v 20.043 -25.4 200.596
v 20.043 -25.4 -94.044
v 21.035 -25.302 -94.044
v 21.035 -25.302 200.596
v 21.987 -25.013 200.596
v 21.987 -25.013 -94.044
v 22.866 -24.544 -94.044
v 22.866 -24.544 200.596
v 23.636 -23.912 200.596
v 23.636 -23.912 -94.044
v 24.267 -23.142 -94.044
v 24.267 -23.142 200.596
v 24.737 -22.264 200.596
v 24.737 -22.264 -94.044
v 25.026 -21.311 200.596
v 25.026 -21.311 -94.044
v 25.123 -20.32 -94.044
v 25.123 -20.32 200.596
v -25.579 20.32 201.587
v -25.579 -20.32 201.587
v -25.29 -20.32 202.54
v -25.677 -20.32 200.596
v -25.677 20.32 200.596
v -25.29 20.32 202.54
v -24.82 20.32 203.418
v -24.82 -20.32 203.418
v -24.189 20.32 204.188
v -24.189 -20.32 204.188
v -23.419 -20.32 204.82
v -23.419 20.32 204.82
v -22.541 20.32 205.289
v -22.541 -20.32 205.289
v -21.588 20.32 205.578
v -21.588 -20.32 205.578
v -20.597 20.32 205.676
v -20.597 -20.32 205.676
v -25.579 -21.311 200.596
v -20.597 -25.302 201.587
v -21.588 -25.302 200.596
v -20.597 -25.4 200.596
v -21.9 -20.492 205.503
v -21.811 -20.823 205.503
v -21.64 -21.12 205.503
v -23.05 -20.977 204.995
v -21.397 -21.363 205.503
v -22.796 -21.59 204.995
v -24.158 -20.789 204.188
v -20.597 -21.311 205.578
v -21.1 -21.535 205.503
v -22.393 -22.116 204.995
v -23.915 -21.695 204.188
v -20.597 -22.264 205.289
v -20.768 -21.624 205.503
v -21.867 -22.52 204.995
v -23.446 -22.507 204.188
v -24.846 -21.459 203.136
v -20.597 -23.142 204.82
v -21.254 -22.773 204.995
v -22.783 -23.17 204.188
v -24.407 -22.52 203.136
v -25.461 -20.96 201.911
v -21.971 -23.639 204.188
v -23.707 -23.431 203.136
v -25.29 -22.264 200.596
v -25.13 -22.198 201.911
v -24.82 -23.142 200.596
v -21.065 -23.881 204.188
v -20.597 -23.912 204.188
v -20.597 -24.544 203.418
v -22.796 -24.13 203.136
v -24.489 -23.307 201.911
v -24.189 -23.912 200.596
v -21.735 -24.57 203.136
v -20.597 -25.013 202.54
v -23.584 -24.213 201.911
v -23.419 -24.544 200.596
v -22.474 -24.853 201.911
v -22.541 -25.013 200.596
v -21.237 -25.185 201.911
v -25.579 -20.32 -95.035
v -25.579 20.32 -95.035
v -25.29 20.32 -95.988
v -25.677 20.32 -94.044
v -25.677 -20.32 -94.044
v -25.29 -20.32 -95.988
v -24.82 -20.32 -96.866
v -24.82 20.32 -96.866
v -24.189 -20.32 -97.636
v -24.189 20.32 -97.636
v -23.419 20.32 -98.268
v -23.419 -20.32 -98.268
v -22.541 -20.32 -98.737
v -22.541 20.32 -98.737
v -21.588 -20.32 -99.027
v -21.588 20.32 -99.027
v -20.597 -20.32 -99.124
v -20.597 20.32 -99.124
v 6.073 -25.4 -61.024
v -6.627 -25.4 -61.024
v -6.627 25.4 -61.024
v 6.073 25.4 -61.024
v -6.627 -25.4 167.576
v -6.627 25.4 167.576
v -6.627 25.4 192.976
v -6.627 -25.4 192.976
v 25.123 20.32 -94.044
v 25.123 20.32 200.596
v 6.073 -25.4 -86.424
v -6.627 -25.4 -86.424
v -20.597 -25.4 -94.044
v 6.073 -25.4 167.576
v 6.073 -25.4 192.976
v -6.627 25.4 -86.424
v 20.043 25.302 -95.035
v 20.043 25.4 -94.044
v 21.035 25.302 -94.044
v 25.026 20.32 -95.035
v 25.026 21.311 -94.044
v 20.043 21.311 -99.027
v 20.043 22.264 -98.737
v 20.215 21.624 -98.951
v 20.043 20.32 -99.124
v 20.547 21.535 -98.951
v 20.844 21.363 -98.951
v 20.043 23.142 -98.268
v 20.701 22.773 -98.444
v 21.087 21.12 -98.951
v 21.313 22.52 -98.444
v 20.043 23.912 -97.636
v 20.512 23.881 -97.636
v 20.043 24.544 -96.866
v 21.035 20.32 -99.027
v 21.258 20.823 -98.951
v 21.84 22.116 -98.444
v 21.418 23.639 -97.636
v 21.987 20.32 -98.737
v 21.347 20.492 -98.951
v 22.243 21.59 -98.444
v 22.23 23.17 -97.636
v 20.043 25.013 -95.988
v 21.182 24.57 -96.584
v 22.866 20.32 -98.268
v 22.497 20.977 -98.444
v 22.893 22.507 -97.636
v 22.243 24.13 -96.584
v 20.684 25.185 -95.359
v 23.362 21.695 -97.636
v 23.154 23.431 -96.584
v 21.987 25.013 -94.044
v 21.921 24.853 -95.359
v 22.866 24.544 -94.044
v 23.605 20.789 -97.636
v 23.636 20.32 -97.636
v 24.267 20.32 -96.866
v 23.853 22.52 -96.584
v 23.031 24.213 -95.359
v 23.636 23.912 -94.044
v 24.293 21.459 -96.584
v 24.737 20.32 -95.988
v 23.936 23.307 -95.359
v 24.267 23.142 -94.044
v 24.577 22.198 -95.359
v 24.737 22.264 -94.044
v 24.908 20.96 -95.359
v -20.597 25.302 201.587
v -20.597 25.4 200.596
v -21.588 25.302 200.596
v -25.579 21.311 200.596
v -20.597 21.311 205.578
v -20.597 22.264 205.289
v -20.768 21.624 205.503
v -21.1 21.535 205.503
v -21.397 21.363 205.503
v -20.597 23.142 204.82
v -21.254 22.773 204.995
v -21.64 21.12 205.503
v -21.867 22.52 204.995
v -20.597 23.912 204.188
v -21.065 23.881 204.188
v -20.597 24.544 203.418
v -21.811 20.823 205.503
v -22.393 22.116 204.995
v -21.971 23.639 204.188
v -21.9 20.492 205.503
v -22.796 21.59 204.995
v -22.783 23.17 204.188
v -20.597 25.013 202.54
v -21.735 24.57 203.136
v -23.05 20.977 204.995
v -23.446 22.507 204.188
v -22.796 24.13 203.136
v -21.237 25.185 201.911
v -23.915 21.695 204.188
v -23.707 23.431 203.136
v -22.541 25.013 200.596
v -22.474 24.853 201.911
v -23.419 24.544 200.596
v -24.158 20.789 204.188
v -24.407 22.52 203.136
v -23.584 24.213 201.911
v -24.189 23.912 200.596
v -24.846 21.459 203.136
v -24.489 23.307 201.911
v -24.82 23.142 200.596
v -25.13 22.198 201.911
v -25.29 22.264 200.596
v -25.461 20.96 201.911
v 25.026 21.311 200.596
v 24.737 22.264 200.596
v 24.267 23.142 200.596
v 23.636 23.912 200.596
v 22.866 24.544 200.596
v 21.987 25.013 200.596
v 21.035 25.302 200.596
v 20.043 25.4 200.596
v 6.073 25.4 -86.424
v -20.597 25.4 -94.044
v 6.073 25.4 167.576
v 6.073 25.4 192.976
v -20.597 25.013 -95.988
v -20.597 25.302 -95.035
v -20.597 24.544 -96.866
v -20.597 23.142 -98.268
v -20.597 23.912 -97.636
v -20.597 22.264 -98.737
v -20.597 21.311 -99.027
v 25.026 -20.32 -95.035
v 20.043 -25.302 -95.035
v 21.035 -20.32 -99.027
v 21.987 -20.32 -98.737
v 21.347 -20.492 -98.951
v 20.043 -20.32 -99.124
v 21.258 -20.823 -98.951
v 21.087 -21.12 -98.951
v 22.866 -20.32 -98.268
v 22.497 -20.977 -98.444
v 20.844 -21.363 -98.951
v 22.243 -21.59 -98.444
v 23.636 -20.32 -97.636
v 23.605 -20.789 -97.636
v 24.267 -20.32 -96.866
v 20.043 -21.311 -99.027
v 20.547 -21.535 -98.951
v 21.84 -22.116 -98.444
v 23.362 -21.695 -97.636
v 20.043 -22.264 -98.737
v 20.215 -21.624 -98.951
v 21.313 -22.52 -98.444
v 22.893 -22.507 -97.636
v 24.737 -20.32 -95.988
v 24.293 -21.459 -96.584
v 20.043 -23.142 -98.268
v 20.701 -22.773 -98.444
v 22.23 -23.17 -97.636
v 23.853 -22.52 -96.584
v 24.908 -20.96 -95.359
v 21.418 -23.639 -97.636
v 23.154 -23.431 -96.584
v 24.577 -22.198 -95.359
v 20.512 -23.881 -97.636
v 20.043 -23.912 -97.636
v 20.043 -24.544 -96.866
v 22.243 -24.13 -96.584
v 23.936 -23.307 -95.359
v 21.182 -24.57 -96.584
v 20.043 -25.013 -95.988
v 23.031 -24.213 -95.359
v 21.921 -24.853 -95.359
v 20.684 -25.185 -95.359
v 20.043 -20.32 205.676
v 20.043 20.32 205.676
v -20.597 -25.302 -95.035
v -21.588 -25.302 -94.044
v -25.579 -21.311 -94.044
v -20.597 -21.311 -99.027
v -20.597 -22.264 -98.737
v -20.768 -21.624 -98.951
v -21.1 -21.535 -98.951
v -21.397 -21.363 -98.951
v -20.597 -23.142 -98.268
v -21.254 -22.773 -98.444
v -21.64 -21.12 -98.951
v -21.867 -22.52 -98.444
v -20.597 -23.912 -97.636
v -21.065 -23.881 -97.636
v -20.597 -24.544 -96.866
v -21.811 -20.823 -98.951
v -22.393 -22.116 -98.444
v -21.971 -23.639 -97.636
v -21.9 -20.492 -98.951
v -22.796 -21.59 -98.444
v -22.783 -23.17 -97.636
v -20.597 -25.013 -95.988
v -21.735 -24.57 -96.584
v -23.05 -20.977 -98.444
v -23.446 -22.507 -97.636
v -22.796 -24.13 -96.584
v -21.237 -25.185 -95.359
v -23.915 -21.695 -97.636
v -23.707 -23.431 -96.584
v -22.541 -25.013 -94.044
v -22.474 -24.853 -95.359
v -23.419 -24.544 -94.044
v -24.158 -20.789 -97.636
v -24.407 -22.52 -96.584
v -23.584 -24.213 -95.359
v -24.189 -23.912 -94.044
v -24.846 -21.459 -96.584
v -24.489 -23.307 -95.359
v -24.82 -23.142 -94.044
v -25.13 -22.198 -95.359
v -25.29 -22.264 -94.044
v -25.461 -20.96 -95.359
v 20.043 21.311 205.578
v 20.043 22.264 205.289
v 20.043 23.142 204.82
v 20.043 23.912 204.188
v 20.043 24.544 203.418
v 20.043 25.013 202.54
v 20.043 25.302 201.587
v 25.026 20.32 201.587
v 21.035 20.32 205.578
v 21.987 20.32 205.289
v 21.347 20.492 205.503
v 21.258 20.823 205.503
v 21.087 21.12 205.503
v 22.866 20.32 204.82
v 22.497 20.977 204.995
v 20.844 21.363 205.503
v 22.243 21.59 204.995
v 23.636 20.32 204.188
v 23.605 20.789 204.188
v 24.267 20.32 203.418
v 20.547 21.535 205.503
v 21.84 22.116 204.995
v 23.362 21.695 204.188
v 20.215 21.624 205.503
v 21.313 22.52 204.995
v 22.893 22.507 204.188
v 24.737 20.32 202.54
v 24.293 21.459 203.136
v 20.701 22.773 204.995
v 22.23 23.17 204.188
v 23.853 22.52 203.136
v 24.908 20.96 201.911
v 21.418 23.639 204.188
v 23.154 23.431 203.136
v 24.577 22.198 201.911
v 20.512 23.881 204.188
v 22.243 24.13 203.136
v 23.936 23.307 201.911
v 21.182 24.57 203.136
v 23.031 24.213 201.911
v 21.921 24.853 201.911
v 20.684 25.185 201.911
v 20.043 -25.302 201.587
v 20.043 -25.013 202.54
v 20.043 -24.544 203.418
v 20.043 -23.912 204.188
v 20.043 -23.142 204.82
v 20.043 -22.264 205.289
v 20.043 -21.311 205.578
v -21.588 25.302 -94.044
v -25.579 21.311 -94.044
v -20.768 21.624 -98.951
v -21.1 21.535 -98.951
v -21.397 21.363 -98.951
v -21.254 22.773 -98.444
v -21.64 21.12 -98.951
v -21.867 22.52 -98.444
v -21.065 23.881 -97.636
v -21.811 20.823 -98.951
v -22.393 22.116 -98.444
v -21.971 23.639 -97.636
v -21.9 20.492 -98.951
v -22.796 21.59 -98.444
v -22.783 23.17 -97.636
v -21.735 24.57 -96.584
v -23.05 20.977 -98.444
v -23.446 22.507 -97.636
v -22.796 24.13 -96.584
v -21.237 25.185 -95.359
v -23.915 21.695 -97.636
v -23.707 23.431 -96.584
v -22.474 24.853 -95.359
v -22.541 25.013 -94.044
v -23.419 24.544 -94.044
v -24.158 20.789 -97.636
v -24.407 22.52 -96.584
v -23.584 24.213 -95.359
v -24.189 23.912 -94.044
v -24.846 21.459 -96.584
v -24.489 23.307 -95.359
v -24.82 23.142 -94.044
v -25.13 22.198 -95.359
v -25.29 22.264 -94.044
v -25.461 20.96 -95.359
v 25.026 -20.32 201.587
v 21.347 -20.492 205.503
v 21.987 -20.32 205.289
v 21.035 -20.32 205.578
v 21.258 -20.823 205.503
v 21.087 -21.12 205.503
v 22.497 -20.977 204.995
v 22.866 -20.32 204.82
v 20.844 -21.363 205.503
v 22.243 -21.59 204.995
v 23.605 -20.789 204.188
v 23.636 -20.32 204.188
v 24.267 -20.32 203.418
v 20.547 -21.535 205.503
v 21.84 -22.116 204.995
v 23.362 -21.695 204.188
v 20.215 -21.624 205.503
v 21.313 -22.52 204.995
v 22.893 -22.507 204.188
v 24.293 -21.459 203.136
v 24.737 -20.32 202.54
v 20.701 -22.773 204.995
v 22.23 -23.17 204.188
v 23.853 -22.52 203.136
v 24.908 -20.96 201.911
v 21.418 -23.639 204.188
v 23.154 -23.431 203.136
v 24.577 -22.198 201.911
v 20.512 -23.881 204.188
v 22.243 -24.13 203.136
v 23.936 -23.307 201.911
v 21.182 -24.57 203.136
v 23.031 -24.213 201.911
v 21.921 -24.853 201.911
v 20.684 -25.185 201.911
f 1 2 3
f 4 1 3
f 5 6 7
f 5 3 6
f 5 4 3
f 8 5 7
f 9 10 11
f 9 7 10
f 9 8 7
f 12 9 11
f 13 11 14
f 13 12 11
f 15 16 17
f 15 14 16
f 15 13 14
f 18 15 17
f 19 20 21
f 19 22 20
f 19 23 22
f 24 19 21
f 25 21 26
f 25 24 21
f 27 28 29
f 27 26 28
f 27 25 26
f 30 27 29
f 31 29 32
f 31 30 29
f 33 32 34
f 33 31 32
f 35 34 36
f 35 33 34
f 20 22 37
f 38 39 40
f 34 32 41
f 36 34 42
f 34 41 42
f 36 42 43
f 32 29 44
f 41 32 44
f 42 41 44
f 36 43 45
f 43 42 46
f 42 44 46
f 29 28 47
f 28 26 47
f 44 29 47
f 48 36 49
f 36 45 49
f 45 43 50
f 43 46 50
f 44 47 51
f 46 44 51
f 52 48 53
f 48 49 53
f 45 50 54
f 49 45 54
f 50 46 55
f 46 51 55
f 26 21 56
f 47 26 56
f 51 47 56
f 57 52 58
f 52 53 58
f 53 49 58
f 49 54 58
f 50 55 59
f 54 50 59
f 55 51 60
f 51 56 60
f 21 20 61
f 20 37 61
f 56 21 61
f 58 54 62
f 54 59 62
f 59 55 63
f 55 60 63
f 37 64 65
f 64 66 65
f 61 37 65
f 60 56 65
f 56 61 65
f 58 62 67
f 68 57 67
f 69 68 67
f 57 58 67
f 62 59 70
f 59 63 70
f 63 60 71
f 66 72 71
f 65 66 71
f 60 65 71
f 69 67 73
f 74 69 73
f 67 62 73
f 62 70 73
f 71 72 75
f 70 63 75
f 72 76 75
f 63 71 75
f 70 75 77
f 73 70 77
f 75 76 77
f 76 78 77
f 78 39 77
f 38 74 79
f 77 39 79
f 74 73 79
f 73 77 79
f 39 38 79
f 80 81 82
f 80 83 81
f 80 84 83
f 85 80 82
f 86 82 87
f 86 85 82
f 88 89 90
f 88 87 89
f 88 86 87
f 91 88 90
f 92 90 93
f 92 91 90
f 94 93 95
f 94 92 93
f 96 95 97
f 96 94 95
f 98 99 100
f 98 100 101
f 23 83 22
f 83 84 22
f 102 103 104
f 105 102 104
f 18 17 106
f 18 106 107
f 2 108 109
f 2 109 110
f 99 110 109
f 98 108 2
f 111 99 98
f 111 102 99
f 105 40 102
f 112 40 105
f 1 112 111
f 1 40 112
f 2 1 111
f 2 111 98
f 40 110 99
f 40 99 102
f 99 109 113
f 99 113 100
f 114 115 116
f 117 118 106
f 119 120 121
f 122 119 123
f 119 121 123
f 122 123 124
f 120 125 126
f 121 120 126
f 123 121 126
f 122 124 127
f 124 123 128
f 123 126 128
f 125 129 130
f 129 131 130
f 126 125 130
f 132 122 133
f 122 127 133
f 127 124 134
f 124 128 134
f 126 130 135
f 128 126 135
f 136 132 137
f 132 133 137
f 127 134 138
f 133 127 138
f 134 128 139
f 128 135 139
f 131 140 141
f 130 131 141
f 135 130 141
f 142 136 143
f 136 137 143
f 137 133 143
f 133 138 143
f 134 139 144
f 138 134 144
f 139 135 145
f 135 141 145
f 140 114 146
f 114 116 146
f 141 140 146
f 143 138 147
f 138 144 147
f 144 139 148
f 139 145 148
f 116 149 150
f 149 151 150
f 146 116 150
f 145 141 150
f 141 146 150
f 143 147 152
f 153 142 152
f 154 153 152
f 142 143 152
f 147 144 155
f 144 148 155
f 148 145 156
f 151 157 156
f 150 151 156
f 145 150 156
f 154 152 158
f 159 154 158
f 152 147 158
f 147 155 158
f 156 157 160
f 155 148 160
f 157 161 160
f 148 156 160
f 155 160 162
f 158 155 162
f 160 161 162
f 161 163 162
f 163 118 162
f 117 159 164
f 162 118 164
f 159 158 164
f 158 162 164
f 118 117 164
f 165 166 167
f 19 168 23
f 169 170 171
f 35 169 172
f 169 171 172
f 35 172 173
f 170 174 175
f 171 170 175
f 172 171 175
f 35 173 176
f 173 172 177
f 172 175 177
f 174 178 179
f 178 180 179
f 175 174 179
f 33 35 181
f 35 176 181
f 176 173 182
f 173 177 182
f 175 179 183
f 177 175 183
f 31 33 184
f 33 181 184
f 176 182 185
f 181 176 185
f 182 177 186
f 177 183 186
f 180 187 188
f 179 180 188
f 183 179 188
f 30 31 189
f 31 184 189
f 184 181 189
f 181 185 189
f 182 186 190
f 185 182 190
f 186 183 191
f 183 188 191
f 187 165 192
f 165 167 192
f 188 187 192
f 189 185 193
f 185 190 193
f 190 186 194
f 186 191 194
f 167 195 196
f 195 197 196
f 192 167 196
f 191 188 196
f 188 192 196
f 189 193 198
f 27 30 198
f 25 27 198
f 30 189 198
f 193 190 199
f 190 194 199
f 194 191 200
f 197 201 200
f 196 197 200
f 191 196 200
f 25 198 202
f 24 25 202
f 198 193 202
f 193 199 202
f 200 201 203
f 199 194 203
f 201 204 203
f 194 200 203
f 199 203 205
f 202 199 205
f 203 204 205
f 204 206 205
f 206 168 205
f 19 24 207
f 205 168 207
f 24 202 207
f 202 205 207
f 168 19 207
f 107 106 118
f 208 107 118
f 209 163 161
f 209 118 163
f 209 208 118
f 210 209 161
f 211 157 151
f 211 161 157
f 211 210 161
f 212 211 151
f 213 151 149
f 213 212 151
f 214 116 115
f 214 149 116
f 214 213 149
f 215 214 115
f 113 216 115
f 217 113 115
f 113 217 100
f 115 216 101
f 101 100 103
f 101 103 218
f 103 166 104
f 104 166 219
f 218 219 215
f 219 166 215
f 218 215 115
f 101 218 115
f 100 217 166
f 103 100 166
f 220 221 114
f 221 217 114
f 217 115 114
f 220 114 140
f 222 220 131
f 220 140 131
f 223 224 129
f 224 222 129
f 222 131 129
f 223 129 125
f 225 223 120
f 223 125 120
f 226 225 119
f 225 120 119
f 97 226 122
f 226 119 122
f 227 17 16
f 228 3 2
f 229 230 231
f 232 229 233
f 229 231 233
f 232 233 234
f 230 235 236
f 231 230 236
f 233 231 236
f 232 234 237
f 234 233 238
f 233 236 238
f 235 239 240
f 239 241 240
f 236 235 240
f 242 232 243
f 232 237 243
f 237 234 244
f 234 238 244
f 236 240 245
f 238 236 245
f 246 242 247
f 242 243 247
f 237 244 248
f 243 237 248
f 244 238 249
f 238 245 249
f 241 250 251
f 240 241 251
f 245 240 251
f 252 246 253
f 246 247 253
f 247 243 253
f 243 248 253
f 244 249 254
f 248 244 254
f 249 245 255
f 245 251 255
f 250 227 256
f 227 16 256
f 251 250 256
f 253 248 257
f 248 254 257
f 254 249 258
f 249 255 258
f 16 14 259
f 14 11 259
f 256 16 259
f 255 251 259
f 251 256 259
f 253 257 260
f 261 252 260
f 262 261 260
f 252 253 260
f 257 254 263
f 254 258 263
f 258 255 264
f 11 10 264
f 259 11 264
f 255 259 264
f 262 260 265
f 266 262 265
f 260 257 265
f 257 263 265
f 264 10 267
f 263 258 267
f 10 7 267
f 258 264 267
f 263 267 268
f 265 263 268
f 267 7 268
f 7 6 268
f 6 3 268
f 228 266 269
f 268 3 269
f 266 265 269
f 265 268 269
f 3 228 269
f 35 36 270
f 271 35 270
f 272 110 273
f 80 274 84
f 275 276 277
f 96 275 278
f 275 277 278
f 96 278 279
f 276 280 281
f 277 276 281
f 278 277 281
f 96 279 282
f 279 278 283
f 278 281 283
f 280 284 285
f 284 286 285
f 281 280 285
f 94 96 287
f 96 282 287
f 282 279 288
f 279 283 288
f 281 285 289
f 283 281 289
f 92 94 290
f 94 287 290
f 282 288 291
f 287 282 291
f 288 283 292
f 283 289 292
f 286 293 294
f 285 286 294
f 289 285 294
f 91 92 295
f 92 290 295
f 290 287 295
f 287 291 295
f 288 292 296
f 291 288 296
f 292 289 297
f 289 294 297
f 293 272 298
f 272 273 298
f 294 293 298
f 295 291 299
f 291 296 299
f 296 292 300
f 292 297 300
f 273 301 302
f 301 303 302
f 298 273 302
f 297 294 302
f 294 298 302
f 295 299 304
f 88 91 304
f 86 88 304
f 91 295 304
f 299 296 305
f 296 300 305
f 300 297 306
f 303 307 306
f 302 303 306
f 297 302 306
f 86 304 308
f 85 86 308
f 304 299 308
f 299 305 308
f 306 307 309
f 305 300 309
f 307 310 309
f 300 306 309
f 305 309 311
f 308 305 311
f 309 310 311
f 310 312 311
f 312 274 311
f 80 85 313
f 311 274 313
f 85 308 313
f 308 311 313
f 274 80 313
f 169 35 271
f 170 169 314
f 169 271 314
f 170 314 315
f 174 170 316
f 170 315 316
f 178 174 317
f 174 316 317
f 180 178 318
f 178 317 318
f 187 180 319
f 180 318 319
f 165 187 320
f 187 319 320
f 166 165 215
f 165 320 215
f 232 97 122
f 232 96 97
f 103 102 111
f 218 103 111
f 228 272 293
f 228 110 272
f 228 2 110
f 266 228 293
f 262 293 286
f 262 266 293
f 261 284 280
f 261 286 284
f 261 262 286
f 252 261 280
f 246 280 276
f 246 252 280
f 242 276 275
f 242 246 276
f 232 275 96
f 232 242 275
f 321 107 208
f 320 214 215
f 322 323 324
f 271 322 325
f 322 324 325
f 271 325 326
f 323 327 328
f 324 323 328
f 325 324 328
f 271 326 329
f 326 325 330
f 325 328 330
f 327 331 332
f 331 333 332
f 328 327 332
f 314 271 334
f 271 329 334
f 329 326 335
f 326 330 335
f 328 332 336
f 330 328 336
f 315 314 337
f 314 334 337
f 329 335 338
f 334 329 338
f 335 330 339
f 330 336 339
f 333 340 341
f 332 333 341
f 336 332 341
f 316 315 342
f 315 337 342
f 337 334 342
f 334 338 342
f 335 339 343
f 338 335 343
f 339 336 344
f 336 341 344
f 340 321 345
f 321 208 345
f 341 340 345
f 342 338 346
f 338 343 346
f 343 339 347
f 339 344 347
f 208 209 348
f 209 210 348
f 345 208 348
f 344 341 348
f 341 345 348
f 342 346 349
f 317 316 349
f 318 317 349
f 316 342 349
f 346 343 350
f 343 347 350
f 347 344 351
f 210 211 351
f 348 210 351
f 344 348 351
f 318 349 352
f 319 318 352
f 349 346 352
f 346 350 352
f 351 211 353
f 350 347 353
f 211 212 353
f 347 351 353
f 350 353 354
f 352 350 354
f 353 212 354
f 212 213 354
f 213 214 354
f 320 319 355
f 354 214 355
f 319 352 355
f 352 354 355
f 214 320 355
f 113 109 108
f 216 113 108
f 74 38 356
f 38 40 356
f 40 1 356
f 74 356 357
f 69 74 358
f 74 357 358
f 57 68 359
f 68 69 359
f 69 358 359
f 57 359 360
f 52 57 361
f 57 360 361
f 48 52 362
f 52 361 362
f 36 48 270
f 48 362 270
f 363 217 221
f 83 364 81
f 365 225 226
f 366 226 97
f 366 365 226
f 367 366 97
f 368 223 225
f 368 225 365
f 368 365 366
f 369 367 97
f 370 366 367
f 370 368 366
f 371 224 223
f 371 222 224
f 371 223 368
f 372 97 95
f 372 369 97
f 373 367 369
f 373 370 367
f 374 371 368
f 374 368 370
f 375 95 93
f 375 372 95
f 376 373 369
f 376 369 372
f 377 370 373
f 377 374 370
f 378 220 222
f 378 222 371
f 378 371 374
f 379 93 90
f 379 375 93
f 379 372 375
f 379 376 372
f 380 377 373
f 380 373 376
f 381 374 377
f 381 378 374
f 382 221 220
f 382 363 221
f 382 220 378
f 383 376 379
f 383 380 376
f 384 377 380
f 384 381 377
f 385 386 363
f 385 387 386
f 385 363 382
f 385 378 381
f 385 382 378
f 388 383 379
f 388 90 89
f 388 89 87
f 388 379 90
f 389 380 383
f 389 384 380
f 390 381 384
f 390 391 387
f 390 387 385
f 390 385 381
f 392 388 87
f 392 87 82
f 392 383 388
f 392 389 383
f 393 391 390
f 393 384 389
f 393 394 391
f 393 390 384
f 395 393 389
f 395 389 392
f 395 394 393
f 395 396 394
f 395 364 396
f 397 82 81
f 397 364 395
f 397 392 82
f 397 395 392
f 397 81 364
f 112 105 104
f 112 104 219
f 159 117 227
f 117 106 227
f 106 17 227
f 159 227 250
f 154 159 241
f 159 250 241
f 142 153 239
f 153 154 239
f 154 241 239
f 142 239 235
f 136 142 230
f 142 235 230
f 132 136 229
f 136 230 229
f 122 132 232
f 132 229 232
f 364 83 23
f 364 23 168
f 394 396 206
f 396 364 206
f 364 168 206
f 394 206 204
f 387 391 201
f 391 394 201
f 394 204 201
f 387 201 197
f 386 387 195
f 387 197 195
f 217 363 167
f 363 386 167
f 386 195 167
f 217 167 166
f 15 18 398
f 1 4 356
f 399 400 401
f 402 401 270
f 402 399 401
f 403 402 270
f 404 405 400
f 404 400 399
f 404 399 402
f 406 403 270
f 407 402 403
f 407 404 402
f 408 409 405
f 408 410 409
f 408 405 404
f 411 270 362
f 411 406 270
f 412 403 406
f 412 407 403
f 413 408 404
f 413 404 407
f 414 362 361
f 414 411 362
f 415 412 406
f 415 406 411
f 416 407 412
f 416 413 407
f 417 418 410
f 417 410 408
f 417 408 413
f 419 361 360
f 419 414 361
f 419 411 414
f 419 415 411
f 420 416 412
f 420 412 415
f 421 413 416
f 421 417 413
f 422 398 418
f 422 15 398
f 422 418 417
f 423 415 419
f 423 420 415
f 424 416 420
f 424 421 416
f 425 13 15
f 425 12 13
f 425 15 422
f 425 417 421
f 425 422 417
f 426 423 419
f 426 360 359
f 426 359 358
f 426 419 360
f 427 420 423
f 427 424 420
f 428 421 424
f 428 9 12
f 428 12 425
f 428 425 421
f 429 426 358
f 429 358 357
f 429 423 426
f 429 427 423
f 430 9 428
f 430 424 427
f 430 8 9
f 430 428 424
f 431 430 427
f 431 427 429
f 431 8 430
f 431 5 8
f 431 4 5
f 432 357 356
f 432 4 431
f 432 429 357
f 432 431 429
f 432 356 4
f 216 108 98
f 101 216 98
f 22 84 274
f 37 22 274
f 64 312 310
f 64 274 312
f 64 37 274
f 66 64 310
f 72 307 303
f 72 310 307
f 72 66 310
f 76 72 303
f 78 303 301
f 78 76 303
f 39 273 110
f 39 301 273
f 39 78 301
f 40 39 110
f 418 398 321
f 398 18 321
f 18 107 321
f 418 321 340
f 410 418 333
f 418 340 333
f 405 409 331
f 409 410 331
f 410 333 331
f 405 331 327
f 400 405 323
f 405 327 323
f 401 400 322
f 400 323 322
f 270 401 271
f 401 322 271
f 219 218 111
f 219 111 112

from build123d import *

# Parameters (mm, degrees)
F0_W     = 50.8
F0_H     = 304.8
F1_DEPTH = 25.4
F2_R     = 5.08
F3_W     = 12.7
F3_H     = 25.4
F4_DEPTH = 50.801
F5_W     = 12.7
F5_H     = 25.4
F6_DEPTH = 50.801


with BuildPart() as f1:
    # F0 (on Front) → F1 (new body, symmetric)
    with BuildSketch(Plane.XZ):
        with Locations((-0.276533, 53.275813)):
            Rectangle(F0_W, F0_H)
    extrude(amount=F1_DEPTH, both=True)

    # F2
    f2_edges = [f1.edges().sort_by_distance(p)[0] for p in [
        (25.123467, -25.4, 53.275813),
        (25.123467, 25.4, 53.275813),
        (-25.676533, 25.4, 53.275813),
        (-25.676533, -25.4, 53.275813),
        (25.123467, 0, 205.675813),
        (-0.276533, 25.4, 205.675813),
        (-25.676533, 0, 205.675813),
        (-0.276533, -25.4, 205.675813),
        (-0.276533, 25.4, -99.124187),
        (25.123467, 0, -99.124187),
        (-0.276533, -25.4, -99.124187),
        (-25.676533, 0, -99.124187),
    ]]
    fillet(f2_edges, radius=F2_R)

    # F3 (on face) → F4 (cut, through all)
    with BuildSketch(Plane.XZ.offset(25.4)):
        with Locations((-0.276533, 180.275813)):
            Rectangle(F3_W, F3_H)
    extrude(amount=-F4_DEPTH, mode=Mode.SUBTRACT)

    # F5 (on face) → F6 (cut, through all)
    with BuildSketch(Plane.XZ.offset(25.4)):
        with Locations((-0.276533, -73.724187)):
            Rectangle(F5_W, F5_H)
    extrude(amount=-F6_DEPTH, mode=Mode.SUBTRACT)


solid = f1.part
